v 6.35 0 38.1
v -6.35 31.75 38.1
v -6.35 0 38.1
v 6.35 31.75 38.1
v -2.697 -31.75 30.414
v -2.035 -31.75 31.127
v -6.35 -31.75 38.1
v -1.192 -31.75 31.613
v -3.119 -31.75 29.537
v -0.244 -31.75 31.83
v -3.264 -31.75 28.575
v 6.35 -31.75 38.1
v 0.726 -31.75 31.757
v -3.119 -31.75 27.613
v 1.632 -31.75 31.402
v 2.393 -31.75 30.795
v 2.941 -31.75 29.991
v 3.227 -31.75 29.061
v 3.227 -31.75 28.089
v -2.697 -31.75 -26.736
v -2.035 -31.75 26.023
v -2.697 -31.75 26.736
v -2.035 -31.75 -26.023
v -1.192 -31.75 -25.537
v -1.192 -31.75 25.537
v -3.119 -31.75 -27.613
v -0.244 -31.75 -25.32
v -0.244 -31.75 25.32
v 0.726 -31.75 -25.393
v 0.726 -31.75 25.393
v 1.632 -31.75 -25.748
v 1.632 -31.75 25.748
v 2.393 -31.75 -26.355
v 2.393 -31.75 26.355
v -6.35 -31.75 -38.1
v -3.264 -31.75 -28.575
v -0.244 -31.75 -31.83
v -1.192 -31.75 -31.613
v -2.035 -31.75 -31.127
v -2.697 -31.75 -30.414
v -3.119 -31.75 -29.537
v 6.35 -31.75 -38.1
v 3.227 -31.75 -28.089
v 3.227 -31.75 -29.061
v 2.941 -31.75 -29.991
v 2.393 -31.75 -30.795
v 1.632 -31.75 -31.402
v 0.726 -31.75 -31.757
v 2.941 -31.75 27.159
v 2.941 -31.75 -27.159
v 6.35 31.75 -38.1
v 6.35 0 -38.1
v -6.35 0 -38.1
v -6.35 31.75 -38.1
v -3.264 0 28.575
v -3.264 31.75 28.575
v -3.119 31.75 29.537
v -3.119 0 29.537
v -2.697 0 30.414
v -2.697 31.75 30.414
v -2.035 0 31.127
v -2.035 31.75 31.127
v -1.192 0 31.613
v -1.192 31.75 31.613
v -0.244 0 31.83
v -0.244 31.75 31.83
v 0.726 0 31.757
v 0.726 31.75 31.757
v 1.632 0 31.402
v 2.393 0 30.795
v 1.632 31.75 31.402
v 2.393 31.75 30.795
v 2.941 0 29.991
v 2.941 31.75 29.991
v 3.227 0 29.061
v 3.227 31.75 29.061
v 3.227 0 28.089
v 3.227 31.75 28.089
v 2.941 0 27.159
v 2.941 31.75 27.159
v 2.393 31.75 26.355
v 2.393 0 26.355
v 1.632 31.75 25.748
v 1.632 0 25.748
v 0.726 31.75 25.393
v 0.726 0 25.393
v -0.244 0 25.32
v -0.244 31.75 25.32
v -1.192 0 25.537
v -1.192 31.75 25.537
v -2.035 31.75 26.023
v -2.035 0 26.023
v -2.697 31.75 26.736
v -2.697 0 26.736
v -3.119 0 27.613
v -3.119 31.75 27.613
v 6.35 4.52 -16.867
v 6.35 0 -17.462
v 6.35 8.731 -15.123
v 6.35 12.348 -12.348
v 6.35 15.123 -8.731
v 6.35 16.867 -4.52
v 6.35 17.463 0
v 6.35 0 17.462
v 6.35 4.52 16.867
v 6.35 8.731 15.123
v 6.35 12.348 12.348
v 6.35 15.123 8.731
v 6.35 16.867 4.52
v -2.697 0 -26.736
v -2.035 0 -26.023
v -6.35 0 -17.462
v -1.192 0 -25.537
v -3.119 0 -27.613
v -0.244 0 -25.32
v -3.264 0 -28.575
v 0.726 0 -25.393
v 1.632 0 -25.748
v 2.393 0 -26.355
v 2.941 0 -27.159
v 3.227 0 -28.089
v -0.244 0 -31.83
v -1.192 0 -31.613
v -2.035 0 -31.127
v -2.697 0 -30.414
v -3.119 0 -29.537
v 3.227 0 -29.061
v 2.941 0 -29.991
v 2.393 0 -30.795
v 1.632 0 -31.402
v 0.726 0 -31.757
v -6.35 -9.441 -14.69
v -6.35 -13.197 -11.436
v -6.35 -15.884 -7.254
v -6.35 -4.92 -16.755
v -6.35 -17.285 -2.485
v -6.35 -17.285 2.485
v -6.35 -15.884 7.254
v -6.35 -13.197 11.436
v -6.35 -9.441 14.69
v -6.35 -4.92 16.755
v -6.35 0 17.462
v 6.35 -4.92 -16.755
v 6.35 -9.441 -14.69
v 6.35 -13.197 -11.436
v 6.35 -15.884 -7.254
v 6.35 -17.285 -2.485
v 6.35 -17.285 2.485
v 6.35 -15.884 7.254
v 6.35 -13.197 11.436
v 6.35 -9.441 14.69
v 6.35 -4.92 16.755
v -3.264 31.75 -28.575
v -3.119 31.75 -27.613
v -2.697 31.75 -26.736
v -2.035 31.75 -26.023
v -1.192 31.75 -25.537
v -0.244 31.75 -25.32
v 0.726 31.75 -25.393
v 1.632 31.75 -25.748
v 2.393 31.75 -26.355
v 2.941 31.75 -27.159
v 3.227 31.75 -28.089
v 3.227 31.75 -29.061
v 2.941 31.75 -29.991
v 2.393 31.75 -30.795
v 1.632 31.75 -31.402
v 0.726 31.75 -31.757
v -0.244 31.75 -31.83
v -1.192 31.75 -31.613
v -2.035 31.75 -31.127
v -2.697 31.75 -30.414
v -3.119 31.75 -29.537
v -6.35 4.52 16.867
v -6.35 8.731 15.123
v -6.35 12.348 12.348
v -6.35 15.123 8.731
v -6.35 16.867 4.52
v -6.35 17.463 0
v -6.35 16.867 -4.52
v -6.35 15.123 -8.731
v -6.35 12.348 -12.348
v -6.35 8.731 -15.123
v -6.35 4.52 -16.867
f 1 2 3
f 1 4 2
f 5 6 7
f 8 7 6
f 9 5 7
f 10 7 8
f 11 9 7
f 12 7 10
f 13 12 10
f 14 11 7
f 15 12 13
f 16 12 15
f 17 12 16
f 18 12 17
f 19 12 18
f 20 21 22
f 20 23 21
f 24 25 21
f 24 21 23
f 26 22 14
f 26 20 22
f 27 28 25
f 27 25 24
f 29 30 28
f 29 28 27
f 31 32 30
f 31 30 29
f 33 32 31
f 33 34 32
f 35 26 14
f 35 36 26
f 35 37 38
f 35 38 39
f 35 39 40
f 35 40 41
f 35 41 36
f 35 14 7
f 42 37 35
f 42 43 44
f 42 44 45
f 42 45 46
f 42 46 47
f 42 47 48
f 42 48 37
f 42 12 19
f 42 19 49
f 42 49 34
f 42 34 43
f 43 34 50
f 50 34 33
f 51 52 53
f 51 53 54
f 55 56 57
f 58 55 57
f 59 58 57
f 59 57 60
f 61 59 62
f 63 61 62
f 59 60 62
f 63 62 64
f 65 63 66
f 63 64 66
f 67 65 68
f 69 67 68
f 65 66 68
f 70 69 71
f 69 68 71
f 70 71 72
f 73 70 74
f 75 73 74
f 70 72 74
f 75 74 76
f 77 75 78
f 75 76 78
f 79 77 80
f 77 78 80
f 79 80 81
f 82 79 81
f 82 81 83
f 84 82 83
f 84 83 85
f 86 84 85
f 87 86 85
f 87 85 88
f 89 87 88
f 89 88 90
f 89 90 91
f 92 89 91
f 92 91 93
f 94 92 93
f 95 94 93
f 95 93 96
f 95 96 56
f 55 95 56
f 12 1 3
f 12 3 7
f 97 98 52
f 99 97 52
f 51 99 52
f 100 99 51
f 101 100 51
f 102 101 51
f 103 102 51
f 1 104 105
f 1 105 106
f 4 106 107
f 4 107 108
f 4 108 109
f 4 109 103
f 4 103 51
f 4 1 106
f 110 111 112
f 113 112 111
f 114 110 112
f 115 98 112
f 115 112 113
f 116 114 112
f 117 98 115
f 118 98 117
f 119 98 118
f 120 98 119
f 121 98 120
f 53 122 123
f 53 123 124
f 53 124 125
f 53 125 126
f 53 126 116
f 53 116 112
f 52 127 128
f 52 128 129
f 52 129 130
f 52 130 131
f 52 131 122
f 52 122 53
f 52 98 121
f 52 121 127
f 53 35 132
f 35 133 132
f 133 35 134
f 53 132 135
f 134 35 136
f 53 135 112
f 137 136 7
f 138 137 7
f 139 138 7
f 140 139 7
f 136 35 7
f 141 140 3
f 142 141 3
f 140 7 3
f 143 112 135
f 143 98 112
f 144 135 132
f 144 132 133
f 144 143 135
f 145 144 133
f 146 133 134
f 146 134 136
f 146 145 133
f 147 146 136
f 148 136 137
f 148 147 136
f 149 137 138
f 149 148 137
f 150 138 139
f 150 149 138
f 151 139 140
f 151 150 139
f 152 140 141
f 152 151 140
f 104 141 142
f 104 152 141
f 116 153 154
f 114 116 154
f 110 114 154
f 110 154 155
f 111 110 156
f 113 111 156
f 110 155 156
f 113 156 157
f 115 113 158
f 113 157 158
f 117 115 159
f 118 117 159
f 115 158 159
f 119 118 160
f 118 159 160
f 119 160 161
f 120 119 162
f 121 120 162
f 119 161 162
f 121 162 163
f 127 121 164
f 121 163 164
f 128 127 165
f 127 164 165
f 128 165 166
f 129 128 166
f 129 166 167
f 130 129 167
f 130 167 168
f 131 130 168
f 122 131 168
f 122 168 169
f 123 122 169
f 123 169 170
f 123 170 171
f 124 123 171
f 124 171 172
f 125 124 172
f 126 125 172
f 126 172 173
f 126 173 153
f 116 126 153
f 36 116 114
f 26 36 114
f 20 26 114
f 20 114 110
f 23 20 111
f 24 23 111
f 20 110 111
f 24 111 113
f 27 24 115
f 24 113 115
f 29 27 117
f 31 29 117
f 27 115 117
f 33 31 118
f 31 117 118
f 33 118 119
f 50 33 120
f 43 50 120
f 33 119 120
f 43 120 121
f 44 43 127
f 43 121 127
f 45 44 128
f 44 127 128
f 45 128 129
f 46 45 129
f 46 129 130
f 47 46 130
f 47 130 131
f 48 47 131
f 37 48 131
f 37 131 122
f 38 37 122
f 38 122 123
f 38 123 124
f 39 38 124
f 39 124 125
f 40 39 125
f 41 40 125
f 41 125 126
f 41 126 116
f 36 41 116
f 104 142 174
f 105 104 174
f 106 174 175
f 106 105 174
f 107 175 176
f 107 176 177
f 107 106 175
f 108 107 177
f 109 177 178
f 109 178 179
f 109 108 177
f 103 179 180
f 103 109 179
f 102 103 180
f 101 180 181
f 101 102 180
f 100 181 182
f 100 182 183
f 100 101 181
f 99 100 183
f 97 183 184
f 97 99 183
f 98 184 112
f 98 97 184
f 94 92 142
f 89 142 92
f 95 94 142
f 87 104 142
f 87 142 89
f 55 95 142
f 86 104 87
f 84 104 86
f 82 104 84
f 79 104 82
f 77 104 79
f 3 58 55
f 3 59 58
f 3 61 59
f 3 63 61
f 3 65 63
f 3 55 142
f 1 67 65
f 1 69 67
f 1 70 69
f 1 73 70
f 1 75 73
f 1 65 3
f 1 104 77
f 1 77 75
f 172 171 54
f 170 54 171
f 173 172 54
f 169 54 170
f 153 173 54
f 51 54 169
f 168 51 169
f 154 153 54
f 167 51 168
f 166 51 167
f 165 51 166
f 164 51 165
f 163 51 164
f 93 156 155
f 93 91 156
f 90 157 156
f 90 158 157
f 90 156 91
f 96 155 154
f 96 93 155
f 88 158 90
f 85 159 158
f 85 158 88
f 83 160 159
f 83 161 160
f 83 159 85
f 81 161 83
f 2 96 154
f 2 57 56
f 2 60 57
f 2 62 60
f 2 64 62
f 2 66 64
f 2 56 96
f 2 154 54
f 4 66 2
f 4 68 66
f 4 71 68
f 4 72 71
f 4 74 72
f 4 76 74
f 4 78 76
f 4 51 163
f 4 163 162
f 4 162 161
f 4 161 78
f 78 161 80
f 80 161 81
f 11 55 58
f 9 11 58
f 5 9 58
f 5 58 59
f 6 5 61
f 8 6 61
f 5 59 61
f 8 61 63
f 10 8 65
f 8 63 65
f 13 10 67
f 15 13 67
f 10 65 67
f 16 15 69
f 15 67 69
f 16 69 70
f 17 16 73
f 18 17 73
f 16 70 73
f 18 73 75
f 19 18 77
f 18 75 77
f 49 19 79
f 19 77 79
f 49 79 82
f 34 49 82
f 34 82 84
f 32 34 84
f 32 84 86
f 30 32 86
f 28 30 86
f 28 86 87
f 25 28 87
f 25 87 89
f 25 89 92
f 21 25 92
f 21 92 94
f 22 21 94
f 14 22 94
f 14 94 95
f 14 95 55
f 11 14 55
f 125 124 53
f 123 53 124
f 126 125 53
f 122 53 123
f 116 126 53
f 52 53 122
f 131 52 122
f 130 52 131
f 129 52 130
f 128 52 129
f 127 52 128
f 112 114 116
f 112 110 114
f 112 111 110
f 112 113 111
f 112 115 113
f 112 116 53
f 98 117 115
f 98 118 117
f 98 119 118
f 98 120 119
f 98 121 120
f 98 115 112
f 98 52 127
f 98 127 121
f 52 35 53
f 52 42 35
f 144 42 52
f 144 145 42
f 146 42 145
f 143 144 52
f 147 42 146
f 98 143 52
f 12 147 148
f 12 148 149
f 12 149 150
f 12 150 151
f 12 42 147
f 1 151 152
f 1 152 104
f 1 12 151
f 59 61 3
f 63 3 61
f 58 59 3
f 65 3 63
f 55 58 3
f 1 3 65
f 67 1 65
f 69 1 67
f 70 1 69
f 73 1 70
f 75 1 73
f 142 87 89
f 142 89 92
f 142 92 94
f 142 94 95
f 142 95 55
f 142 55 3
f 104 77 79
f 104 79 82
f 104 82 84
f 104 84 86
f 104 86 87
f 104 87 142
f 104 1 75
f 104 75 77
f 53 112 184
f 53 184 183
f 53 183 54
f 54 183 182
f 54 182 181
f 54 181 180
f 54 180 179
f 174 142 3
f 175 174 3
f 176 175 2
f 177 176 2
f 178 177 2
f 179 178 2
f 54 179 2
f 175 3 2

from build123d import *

# Parameters (mm, degrees)
F1_DEPTH = 6.35
F3_D     = 6.5278
F4_DEPTH = 6.35
F6_D     = 6.5278


with BuildPart() as f1:
    # F0 (on Right) → F1 (new body, symmetric)
    with BuildSketch(Plane.YZ):
        with BuildLine():
            ThreePointArc((0, 17.4625), (12.3478521665, 12.3478521665), (17.4625, 0))
            ThreePointArc((17.4625, 0), (12.3478521665, -12.3478521665), (0, -17.4625))
            Line((0, -17.4625), (0, -38.1))
            Line((0, -38.1), (31.75, -38.1))
            Line((31.75, -38.1), (31.75, 38.1))
            Line((31.75, 38.1), (0, 38.1))
            Line((0, 38.1), (0, 17.4625))
        make_face()
    extrude(amount=F1_DEPTH, both=True)

    # F3 (through all)
    with Locations(Plane.XZ):
        with Locations((0, 28.575), (0, -28.575)):
            Hole(F3_D / 2)


with BuildPart() as f4:
    # F0 (on Right) → F4 (new body, symmetric)
    with BuildSketch(Plane.YZ):
        with BuildLine():
            ThreePointArc((0, -17.4625), (-17.4625, 0), (0, 17.4625))
            Line((0, 17.4625), (0, 38.1))
            Line((0, 38.1), (-31.75, 38.1))
            Line((-31.75, 38.1), (-31.75, -38.1))
            Line((-31.75, -38.1), (0, -38.1))
            Line((0, -38.1), (0, -17.4625))
        make_face()
    extrude(amount=F4_DEPTH, both=True)

    # F6 (through all)
    with Locations(Plane.XZ.offset(31.75)):
        with Locations((0, 28.575), (0, -28.575)):
            Hole(F6_D / 2)


solid = Compound([f1.part, f4.part])
